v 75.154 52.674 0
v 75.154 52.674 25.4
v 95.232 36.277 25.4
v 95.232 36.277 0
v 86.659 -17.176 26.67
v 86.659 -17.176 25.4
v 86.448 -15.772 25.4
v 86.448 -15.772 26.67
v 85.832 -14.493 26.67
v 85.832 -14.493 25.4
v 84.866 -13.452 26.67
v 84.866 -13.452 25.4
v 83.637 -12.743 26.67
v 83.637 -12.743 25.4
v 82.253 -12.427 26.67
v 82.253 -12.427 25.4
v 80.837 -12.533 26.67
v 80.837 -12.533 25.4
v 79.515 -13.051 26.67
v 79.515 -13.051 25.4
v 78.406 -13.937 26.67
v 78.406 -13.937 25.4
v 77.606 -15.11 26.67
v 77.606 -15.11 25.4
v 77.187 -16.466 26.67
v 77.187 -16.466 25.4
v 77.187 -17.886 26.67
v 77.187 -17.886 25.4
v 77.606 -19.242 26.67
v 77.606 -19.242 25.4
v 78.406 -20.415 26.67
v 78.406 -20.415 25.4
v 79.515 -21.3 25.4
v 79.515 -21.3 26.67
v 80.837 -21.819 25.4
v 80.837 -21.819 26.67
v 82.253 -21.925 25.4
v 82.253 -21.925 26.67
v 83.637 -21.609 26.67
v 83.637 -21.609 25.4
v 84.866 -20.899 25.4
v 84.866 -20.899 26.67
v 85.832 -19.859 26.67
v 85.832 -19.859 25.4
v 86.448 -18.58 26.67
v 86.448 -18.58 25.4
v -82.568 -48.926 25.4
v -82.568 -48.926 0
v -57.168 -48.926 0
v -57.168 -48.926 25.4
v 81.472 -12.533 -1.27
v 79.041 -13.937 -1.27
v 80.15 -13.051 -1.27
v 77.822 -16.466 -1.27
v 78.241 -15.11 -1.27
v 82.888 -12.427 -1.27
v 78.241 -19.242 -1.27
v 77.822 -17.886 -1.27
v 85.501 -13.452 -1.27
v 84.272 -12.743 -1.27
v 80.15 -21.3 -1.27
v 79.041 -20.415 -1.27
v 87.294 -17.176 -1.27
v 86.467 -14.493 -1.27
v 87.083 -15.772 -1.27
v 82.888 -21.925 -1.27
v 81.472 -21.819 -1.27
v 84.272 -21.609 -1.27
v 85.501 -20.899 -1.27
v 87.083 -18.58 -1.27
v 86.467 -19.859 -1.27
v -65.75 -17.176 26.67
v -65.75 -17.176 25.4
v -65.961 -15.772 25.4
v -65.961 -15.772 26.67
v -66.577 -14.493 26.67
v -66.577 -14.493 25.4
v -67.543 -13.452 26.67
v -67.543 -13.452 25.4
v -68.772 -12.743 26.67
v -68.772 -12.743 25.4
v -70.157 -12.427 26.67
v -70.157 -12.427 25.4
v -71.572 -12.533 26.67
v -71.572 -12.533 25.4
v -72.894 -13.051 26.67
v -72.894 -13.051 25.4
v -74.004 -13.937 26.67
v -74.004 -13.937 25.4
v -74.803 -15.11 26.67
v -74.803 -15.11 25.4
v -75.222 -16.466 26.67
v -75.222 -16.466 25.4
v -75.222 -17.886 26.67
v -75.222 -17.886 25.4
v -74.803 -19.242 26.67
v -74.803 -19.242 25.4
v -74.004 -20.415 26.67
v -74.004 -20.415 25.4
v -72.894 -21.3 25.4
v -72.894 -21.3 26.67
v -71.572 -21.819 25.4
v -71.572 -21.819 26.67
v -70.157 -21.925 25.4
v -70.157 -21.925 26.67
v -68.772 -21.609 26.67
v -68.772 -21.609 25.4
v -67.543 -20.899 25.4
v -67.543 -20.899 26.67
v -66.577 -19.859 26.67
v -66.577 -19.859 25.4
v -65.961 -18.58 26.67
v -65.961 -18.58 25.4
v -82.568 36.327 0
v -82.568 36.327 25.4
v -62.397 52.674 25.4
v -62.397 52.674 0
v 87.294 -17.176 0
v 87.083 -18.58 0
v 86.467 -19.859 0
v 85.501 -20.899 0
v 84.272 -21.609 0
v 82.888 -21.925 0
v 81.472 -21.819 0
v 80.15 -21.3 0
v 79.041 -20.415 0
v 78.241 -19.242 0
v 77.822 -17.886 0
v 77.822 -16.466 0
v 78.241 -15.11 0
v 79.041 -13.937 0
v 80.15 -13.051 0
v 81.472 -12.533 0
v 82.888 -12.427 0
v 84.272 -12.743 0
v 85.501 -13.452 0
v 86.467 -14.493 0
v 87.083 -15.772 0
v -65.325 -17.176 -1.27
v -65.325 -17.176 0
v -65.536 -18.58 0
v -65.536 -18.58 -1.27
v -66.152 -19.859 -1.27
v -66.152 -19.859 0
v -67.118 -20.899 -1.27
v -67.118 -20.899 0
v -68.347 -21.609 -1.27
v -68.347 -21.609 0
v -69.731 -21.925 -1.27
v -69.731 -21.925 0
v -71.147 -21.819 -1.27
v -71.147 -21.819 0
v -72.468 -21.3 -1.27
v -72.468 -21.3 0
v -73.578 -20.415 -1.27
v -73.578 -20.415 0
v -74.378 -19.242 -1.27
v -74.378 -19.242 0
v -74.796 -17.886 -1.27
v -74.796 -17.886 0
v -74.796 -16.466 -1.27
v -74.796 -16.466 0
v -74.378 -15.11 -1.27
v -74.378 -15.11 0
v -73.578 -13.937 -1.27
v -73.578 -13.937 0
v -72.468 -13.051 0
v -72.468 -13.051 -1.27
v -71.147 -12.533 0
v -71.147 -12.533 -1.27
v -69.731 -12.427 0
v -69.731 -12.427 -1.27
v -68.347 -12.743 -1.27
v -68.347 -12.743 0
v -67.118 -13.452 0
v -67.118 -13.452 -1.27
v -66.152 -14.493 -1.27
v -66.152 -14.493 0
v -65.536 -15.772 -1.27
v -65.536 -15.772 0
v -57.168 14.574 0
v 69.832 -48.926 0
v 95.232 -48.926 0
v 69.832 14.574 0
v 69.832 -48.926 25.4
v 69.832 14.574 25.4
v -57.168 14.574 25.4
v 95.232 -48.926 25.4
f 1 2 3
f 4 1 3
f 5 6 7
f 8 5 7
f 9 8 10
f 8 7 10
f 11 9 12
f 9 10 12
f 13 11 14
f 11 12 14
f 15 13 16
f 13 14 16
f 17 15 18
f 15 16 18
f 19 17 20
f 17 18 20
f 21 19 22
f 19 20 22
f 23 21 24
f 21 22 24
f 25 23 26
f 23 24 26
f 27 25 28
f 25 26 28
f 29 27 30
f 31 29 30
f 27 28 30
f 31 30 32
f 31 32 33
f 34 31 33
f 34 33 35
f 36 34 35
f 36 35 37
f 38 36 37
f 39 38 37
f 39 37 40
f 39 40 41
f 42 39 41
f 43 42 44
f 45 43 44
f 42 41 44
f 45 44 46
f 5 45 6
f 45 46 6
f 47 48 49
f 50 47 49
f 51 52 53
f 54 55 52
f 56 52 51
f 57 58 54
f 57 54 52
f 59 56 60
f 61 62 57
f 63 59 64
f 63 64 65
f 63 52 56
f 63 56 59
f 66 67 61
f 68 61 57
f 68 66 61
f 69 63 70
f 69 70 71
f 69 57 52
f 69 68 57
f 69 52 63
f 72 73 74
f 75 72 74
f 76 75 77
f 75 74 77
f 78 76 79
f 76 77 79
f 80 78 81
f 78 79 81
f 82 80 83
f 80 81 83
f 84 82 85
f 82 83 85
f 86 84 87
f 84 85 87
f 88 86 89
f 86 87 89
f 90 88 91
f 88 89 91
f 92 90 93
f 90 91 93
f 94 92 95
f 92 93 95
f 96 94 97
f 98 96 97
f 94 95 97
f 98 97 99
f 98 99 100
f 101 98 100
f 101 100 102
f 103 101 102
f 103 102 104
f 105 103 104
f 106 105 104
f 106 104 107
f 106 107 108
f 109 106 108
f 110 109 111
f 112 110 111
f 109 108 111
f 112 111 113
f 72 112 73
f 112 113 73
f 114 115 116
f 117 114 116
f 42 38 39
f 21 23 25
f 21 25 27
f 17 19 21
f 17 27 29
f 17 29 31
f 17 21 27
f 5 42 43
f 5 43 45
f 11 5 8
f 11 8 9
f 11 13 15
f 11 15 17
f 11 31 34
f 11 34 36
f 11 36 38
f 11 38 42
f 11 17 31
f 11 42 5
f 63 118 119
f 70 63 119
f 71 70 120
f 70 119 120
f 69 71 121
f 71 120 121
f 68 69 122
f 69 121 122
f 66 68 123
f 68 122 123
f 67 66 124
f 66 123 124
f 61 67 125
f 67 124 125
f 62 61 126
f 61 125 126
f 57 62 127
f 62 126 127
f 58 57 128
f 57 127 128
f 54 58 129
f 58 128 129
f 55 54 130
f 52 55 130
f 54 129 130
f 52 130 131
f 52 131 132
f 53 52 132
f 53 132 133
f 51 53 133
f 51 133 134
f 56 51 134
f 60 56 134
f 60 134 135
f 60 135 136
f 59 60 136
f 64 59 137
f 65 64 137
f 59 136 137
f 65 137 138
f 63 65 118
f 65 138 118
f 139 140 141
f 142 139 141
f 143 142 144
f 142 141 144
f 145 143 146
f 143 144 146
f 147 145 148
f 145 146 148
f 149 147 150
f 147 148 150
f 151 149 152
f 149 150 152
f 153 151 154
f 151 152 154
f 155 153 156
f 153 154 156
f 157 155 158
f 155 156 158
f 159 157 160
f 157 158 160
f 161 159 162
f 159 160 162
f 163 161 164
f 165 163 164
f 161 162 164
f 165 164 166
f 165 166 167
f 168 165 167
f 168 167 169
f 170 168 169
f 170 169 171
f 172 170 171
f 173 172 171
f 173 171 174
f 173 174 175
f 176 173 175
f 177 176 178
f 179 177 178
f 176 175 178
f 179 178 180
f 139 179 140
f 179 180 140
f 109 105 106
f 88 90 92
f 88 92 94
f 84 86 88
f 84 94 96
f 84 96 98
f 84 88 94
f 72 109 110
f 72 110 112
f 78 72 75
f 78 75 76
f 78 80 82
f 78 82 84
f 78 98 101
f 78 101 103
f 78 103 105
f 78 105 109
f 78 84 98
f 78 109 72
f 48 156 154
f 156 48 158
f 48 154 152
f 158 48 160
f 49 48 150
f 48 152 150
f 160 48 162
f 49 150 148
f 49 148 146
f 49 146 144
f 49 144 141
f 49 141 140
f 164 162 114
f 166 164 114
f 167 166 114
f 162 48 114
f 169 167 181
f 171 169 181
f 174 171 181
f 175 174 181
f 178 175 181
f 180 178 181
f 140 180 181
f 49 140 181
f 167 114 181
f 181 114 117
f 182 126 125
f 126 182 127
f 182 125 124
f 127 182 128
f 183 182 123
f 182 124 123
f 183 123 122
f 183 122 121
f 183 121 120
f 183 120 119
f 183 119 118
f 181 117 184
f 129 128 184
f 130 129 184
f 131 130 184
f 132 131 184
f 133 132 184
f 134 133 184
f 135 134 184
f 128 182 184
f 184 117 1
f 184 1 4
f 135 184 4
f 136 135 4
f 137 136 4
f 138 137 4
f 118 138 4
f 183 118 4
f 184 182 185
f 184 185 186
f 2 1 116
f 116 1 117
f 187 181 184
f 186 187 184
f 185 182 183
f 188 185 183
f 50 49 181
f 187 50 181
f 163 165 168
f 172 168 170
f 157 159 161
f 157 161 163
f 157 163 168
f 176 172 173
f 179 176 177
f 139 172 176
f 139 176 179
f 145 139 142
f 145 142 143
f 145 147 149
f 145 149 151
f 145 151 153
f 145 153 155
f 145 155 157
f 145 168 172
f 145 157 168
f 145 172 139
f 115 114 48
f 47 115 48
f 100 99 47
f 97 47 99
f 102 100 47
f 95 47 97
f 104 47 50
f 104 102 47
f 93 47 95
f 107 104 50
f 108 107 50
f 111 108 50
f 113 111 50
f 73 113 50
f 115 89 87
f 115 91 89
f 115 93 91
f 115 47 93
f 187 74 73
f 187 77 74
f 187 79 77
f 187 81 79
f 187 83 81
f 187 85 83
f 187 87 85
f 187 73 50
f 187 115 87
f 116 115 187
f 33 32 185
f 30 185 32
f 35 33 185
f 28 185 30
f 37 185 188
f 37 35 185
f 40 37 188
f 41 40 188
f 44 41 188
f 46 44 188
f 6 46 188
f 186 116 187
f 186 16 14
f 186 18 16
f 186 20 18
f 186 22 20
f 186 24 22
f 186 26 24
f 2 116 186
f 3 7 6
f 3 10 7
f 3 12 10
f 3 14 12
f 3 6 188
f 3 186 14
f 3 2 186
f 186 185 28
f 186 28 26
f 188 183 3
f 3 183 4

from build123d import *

# Parameters (mm, degrees)
F0_W     = 25.4
F0_H     = 63.5
F1_DEPTH = 25.4
F3_DEPTH = 25.4
F4_R     = 4.7625
F5_DEPTH = 1.27
F7_DEPTH = 1.27


with BuildPart() as f1:
    # F0 (on Top) → F1 (new body)
    with BuildSketch(Plane.XY):
        Polygon((95.231725046, 52.6741128501), (-82.568274954, 52.6741128501), (-82.568274954, 14.5741128501), (-57.168274954, 14.5741128501), (69.831725046, 14.5741128501), (95.231725046, 14.5741128501), align=None)
        with Locations((-69.868274954, -17.1758871499)):
            Rectangle(F0_W, F0_H)
        with Locations((82.531725046, -17.1758871499)):
            Rectangle(F0_W, F0_H)
    extrude(amount=F1_DEPTH)

    # F2 (on face) → F3 (cut)
    with BuildSketch(Plane.XY.offset(25.4)):
        Polygon((-104.4803282541, 40.2830914566), (-99.053036825, 22.9674405237), (-44.5216608105, 67.1611169851), (-66.7477198675, 76.2066116208), align=None)
        Polygon((81.9489609954, 70.5137167564), (63.5293972251, 62.1673528543), (115.3344315049, 19.8599052123), (133.17838577, 37.4160547248), align=None)
    extrude(amount=-F3_DEPTH, mode=Mode.SUBTRACT)

    # F4 (on face) → F5 (join)
    with BuildSketch(Plane.XY.offset(25.4)):
        with Locations((-70.5124139786, -17.1758871499)):
            Circle(F4_R)
        with Locations((81.896725046, -17.1758871499)):
            Circle(F4_R)
    extrude(amount=F5_DEPTH)

    # F6 (on face) → F7 (join)
    with BuildSketch(Plane(origin=(0, 0, 0), x_dir=(1, 0, 0), z_dir=(0, 0, -1))):
        with BuildLine():
            ThreePointArc((82.531725046, 21.9383871499), (77.769225046, 17.1758871499), (82.531725046, 12.4133871499))
            Line((82.531725046, 12.4133871499), (82.531725046, 21.9383871499))
        make_face()
        with BuildLine():
            Line((82.531725046, 21.9383871499), (82.531725046, 12.4133871499))
            ThreePointArc((82.531725046, 12.4133871499), (85.8993210914, 13.8082911045), (87.294225046, 17.1758871499))
            ThreePointArc((87.294225046, 17.1758871499), (85.8993210914, 20.5434831953), (82.531725046, 21.9383871499))
        make_face()
        with BuildLine():
            ThreePointArc((-70.0870901346, 12.4133871499), (-66.7194940892, 13.8082911045), (-65.3245901346, 17.1758871499))
            ThreePointArc((-65.3245901346, 17.1758871499), (-66.7194940892, 20.5434831953), (-70.0870901346, 21.9383871499))
            Line((-70.0870901346, 21.9383871499), (-70.0870901346, 12.4133871499))
        make_face()
        with BuildLine():
            Line((-70.0870901346, 12.4133871499), (-70.0870901346, 21.9383871499))
            ThreePointArc((-70.0870901346, 21.9383871499), (-74.8495901346, 17.1758871499), (-70.0870901346, 12.4133871499))
        make_face()
    extrude(amount=F7_DEPTH)


solid = f1.part
